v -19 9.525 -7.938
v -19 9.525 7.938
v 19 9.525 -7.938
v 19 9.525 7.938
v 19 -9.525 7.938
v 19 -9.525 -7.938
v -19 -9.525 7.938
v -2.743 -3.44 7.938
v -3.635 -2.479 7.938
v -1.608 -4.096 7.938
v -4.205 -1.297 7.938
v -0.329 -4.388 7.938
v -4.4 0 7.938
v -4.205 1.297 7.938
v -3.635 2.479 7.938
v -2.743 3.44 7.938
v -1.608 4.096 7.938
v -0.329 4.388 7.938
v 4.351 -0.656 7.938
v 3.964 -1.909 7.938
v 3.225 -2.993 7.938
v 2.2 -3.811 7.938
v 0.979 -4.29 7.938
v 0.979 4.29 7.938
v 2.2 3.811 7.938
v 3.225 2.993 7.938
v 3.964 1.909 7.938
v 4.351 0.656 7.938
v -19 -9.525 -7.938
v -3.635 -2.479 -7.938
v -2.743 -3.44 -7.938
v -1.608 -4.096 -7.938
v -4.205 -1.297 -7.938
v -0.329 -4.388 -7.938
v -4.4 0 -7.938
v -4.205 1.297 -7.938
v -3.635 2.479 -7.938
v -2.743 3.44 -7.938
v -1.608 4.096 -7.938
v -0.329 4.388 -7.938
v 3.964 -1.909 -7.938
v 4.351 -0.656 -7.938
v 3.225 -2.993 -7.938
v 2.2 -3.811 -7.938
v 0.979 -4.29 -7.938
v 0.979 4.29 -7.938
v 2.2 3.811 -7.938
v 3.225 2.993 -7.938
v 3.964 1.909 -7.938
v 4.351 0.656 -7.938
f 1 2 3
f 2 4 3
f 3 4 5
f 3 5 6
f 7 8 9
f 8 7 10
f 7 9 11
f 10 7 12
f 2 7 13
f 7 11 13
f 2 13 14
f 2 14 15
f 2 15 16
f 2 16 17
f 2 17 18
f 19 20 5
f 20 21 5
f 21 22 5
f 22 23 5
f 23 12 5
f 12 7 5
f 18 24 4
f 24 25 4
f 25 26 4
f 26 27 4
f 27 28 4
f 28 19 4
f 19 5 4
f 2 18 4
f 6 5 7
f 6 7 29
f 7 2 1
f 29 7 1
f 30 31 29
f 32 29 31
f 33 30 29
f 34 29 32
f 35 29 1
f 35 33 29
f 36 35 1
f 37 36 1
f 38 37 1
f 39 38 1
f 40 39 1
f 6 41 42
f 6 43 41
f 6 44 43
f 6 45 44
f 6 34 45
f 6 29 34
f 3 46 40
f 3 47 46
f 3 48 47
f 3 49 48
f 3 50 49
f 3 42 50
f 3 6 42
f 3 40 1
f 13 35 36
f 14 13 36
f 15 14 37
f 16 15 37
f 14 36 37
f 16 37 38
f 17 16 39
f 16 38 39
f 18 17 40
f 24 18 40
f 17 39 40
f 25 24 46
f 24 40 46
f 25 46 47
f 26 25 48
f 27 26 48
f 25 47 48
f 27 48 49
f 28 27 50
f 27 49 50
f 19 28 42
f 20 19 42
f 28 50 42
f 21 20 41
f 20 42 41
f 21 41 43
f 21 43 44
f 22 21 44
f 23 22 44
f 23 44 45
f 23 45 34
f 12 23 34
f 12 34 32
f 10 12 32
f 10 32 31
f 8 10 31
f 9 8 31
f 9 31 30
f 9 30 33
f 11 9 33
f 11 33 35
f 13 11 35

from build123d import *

# Parameters (mm, degrees)
SKETCH1_W               = 15.875
SKETCH1_H               = 19.05
BOSS_EXTRUDE1_DEPTH     = 19
M10X1_25_TAPPED_HOLE1_D = 8.8


with BuildPart() as part:
    # Sketch1 → Boss-Extrude1 (new, symmetric)
    with BuildSketch(Plane(origin=(0, 0, 0), x_dir=(0, 0, -1), z_dir=(1, 0, 0))):
        Rectangle(SKETCH1_W, SKETCH1_H)
    extrude(amount=BOSS_EXTRUDE1_DEPTH, both=True)

    # M10x1.25 Tapped Hole1 (through all)
    with Locations(Plane.XY.offset(7.9375)):
        with Locations((0, 0)):
            Hole(M10X1_25_TAPPED_HOLE1_D / 2)


solid = part.part
